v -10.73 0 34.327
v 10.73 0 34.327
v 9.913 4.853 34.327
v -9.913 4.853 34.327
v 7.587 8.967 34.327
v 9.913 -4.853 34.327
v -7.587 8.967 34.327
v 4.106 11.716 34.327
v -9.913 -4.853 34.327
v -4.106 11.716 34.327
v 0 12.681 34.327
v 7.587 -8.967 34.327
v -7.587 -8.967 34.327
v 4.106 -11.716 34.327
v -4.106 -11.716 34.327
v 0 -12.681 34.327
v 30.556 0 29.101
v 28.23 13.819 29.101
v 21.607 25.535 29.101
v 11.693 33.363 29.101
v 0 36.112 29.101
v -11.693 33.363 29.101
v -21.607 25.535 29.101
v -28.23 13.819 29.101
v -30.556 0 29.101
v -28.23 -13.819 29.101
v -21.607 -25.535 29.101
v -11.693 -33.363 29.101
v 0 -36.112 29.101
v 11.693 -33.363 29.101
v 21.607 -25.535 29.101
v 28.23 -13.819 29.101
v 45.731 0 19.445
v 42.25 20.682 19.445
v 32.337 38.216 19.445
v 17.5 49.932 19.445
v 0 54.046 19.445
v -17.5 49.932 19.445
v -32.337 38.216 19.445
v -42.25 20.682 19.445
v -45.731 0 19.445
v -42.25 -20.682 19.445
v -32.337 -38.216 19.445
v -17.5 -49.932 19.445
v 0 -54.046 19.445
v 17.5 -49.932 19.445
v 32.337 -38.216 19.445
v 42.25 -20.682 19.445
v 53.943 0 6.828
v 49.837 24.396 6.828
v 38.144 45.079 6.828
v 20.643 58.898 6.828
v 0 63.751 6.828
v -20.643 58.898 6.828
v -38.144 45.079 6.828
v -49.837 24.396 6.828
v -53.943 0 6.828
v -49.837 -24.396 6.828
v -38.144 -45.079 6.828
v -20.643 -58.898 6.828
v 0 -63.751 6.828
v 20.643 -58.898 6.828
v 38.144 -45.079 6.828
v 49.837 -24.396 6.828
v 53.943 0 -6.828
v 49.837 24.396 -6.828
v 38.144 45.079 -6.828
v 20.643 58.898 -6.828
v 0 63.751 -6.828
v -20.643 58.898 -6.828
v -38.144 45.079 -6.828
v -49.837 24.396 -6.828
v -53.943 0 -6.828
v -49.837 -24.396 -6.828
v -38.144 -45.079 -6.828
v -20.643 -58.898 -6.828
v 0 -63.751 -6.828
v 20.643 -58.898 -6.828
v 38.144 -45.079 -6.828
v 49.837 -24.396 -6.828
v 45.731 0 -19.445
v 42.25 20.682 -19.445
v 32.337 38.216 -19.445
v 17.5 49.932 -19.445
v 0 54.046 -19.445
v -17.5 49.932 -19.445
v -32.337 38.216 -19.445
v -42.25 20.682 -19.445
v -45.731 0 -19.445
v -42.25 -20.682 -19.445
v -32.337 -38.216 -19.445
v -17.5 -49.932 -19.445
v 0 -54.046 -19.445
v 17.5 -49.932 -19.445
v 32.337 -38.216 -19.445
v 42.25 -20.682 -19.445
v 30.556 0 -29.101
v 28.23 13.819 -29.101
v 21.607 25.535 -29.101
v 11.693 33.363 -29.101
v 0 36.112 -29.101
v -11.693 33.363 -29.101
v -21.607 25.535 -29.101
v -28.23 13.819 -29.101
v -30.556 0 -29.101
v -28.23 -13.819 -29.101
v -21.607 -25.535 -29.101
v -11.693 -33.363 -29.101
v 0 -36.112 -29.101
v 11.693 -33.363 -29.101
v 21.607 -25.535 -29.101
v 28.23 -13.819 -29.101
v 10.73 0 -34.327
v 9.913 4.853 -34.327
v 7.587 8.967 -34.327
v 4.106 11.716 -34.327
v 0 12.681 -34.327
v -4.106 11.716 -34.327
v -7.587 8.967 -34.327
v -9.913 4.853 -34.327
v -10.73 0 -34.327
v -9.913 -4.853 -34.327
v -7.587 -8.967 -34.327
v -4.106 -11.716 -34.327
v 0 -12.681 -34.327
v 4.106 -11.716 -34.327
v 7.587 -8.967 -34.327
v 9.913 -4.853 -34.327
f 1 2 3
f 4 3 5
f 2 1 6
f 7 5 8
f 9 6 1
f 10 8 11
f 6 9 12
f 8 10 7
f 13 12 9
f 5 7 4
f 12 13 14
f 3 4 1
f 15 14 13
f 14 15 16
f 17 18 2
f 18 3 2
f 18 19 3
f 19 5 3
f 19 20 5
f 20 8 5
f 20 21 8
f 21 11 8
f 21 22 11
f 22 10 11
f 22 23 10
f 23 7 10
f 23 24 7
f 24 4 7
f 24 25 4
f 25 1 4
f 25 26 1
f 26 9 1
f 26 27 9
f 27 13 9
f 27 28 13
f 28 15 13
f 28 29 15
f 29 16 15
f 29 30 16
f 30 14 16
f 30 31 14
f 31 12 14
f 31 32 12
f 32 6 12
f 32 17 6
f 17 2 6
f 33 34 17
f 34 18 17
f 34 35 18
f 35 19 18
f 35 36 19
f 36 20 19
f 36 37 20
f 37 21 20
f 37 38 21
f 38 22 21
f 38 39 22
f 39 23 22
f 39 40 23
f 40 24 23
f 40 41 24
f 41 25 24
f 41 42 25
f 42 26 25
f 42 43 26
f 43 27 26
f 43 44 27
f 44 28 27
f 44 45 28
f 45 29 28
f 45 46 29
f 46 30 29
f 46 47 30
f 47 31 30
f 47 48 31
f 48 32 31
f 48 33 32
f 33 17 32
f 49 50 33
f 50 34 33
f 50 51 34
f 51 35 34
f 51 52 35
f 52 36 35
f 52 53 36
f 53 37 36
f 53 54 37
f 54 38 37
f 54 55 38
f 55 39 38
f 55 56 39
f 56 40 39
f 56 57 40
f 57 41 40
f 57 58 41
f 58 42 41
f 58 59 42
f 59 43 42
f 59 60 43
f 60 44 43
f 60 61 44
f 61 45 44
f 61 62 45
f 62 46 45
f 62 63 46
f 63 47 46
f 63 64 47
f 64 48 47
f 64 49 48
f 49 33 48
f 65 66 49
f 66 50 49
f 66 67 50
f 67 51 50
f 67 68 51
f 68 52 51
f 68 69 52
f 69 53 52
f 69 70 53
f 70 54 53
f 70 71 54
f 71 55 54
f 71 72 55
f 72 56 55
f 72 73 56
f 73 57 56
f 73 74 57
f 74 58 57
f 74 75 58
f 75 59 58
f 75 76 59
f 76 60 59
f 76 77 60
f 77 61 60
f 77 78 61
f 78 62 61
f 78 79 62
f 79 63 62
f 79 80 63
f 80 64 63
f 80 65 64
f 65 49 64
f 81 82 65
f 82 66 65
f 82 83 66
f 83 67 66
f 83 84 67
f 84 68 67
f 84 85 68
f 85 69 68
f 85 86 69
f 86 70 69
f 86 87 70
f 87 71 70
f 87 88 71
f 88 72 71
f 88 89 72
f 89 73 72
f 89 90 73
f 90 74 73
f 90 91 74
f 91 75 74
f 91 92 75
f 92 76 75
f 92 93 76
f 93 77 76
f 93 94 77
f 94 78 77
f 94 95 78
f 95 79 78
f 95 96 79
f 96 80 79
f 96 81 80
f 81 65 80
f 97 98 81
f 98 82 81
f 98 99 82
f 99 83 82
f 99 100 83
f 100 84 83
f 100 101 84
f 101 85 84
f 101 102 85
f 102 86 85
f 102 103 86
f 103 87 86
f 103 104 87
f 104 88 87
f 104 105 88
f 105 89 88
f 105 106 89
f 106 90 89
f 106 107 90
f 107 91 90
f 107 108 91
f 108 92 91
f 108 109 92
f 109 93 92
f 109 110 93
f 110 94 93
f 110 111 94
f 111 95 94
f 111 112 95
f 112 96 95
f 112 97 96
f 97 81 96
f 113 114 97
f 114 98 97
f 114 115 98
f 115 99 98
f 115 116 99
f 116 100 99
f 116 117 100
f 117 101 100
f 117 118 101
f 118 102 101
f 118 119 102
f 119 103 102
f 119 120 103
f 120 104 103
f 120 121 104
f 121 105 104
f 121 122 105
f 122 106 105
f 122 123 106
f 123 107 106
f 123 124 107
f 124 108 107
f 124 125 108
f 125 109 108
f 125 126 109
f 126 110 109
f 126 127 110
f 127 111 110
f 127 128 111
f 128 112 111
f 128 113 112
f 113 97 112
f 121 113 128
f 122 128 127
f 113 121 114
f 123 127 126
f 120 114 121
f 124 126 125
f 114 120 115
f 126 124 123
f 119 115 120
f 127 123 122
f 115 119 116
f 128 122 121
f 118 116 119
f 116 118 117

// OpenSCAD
// Generated by SolidPython 1.0.1 on 2020-07-29 00:46:49


scale(v = [11, 13, 7]) {
	sphere(r = 5);
}
/***********************************************
*********      SolidPython code:      **********
************************************************
 
# import packages: SolidPython
from solid import *
from solid.utils import *
from itertools import chain, combinations, permutations


class Resize:

    def __init__(self, scad_file):
        self.scad_file = scad_file
        #self.scad_file = import_scad(scad_file)
        # cone/cylinder param:
        self.r1 = 0
        self.r2 = 0
        self.h = 0
        # rectangular prism param:
        self.w = 0
        self.l = 0
        # ellipse param:
        self.r = 0

    # import OpenScad code (file name corresponds to shape)


    # classify shape + parameters
    def assign(self, param1, param2, param3):
        if self.scad_file == 'cone.scad':
            self.r1 = param1
            self.r2 = param2
            self.h = param3
        elif self.scad_file == 'cylinder.scad':
            self.r1 = param1
            self.r2 = param2
            self.h = param3
        elif self.scad_file == 'rectangularPrism.scad':
            self.h = param1
            self.l = param2
            self.w = param3
        else:
            self.r = param1
            self.h = param2

    # resize parameters
    def iterate(self):
        x = range(3, 20, 2)
        i = 1
        if self.scad_file == 'cone.scad':
            tempList = list(permutations(x, 2))
            for temp in tempList:
                param1 = temp[0]
                param2 = temp[1]
                filepath = 'produced_scad_files/' + 'cone' + str(param1) + '_' + str(param2) + '_' + '.scad'
                scad_render_to_file(cylinder(h=param1, r1=param2, r2=0), filepath)

        elif self.scad_file == 'cylinder.scad':
            tempList = list(permutations(x, 3))
            for temp in tempList:
                param1 = temp[0]
                param2 = temp[1]
                filepath = 'produced_scad_files/' + 'cylinder' + str(param1) + '_' + str(param2) + '_' + '.scad'
                scad_render_to_file(cylinder(h=param1, r1=param2, r2=param2), filepath)

        elif self.scad_file == 'rectangularPrism.scad':
            tempList = list(permutations(x, 3))
            for temp in tempList:
                param1 = temp[0]
                param2 = temp[1]
                param3 = temp[2]
                filepath = 'produced_scad_files/' + 'rectangularPrism' + str(param1) + '_' + str(param2) + '_' + str(
                    param3) + '.scad'
                scad_render_to_file(cube(size=(param1, param2, param3)), filepath)

        elif self.scad_file == 'ellipse.scad':
            tempList = list(permutations(x, 4))
            for temp in tempList:
                param1 = temp[0]
                param2 = temp[1]
                param3 = temp[2]
                param4 = temp[3]
                filepath = 'produced_scad_files/' + 'ellipse' + str(param1) + '_' + str(param2) + '_' + str(param3) + '_' + str(param4) + '.scad'
                scad_render_to_file(scale([param1, param2, param3])(sphere(r=param4)), filepath)

    def render_to_scadfile(self):
        scad_render_to_file(scad, 'example.scad') 
 
************************************************/
